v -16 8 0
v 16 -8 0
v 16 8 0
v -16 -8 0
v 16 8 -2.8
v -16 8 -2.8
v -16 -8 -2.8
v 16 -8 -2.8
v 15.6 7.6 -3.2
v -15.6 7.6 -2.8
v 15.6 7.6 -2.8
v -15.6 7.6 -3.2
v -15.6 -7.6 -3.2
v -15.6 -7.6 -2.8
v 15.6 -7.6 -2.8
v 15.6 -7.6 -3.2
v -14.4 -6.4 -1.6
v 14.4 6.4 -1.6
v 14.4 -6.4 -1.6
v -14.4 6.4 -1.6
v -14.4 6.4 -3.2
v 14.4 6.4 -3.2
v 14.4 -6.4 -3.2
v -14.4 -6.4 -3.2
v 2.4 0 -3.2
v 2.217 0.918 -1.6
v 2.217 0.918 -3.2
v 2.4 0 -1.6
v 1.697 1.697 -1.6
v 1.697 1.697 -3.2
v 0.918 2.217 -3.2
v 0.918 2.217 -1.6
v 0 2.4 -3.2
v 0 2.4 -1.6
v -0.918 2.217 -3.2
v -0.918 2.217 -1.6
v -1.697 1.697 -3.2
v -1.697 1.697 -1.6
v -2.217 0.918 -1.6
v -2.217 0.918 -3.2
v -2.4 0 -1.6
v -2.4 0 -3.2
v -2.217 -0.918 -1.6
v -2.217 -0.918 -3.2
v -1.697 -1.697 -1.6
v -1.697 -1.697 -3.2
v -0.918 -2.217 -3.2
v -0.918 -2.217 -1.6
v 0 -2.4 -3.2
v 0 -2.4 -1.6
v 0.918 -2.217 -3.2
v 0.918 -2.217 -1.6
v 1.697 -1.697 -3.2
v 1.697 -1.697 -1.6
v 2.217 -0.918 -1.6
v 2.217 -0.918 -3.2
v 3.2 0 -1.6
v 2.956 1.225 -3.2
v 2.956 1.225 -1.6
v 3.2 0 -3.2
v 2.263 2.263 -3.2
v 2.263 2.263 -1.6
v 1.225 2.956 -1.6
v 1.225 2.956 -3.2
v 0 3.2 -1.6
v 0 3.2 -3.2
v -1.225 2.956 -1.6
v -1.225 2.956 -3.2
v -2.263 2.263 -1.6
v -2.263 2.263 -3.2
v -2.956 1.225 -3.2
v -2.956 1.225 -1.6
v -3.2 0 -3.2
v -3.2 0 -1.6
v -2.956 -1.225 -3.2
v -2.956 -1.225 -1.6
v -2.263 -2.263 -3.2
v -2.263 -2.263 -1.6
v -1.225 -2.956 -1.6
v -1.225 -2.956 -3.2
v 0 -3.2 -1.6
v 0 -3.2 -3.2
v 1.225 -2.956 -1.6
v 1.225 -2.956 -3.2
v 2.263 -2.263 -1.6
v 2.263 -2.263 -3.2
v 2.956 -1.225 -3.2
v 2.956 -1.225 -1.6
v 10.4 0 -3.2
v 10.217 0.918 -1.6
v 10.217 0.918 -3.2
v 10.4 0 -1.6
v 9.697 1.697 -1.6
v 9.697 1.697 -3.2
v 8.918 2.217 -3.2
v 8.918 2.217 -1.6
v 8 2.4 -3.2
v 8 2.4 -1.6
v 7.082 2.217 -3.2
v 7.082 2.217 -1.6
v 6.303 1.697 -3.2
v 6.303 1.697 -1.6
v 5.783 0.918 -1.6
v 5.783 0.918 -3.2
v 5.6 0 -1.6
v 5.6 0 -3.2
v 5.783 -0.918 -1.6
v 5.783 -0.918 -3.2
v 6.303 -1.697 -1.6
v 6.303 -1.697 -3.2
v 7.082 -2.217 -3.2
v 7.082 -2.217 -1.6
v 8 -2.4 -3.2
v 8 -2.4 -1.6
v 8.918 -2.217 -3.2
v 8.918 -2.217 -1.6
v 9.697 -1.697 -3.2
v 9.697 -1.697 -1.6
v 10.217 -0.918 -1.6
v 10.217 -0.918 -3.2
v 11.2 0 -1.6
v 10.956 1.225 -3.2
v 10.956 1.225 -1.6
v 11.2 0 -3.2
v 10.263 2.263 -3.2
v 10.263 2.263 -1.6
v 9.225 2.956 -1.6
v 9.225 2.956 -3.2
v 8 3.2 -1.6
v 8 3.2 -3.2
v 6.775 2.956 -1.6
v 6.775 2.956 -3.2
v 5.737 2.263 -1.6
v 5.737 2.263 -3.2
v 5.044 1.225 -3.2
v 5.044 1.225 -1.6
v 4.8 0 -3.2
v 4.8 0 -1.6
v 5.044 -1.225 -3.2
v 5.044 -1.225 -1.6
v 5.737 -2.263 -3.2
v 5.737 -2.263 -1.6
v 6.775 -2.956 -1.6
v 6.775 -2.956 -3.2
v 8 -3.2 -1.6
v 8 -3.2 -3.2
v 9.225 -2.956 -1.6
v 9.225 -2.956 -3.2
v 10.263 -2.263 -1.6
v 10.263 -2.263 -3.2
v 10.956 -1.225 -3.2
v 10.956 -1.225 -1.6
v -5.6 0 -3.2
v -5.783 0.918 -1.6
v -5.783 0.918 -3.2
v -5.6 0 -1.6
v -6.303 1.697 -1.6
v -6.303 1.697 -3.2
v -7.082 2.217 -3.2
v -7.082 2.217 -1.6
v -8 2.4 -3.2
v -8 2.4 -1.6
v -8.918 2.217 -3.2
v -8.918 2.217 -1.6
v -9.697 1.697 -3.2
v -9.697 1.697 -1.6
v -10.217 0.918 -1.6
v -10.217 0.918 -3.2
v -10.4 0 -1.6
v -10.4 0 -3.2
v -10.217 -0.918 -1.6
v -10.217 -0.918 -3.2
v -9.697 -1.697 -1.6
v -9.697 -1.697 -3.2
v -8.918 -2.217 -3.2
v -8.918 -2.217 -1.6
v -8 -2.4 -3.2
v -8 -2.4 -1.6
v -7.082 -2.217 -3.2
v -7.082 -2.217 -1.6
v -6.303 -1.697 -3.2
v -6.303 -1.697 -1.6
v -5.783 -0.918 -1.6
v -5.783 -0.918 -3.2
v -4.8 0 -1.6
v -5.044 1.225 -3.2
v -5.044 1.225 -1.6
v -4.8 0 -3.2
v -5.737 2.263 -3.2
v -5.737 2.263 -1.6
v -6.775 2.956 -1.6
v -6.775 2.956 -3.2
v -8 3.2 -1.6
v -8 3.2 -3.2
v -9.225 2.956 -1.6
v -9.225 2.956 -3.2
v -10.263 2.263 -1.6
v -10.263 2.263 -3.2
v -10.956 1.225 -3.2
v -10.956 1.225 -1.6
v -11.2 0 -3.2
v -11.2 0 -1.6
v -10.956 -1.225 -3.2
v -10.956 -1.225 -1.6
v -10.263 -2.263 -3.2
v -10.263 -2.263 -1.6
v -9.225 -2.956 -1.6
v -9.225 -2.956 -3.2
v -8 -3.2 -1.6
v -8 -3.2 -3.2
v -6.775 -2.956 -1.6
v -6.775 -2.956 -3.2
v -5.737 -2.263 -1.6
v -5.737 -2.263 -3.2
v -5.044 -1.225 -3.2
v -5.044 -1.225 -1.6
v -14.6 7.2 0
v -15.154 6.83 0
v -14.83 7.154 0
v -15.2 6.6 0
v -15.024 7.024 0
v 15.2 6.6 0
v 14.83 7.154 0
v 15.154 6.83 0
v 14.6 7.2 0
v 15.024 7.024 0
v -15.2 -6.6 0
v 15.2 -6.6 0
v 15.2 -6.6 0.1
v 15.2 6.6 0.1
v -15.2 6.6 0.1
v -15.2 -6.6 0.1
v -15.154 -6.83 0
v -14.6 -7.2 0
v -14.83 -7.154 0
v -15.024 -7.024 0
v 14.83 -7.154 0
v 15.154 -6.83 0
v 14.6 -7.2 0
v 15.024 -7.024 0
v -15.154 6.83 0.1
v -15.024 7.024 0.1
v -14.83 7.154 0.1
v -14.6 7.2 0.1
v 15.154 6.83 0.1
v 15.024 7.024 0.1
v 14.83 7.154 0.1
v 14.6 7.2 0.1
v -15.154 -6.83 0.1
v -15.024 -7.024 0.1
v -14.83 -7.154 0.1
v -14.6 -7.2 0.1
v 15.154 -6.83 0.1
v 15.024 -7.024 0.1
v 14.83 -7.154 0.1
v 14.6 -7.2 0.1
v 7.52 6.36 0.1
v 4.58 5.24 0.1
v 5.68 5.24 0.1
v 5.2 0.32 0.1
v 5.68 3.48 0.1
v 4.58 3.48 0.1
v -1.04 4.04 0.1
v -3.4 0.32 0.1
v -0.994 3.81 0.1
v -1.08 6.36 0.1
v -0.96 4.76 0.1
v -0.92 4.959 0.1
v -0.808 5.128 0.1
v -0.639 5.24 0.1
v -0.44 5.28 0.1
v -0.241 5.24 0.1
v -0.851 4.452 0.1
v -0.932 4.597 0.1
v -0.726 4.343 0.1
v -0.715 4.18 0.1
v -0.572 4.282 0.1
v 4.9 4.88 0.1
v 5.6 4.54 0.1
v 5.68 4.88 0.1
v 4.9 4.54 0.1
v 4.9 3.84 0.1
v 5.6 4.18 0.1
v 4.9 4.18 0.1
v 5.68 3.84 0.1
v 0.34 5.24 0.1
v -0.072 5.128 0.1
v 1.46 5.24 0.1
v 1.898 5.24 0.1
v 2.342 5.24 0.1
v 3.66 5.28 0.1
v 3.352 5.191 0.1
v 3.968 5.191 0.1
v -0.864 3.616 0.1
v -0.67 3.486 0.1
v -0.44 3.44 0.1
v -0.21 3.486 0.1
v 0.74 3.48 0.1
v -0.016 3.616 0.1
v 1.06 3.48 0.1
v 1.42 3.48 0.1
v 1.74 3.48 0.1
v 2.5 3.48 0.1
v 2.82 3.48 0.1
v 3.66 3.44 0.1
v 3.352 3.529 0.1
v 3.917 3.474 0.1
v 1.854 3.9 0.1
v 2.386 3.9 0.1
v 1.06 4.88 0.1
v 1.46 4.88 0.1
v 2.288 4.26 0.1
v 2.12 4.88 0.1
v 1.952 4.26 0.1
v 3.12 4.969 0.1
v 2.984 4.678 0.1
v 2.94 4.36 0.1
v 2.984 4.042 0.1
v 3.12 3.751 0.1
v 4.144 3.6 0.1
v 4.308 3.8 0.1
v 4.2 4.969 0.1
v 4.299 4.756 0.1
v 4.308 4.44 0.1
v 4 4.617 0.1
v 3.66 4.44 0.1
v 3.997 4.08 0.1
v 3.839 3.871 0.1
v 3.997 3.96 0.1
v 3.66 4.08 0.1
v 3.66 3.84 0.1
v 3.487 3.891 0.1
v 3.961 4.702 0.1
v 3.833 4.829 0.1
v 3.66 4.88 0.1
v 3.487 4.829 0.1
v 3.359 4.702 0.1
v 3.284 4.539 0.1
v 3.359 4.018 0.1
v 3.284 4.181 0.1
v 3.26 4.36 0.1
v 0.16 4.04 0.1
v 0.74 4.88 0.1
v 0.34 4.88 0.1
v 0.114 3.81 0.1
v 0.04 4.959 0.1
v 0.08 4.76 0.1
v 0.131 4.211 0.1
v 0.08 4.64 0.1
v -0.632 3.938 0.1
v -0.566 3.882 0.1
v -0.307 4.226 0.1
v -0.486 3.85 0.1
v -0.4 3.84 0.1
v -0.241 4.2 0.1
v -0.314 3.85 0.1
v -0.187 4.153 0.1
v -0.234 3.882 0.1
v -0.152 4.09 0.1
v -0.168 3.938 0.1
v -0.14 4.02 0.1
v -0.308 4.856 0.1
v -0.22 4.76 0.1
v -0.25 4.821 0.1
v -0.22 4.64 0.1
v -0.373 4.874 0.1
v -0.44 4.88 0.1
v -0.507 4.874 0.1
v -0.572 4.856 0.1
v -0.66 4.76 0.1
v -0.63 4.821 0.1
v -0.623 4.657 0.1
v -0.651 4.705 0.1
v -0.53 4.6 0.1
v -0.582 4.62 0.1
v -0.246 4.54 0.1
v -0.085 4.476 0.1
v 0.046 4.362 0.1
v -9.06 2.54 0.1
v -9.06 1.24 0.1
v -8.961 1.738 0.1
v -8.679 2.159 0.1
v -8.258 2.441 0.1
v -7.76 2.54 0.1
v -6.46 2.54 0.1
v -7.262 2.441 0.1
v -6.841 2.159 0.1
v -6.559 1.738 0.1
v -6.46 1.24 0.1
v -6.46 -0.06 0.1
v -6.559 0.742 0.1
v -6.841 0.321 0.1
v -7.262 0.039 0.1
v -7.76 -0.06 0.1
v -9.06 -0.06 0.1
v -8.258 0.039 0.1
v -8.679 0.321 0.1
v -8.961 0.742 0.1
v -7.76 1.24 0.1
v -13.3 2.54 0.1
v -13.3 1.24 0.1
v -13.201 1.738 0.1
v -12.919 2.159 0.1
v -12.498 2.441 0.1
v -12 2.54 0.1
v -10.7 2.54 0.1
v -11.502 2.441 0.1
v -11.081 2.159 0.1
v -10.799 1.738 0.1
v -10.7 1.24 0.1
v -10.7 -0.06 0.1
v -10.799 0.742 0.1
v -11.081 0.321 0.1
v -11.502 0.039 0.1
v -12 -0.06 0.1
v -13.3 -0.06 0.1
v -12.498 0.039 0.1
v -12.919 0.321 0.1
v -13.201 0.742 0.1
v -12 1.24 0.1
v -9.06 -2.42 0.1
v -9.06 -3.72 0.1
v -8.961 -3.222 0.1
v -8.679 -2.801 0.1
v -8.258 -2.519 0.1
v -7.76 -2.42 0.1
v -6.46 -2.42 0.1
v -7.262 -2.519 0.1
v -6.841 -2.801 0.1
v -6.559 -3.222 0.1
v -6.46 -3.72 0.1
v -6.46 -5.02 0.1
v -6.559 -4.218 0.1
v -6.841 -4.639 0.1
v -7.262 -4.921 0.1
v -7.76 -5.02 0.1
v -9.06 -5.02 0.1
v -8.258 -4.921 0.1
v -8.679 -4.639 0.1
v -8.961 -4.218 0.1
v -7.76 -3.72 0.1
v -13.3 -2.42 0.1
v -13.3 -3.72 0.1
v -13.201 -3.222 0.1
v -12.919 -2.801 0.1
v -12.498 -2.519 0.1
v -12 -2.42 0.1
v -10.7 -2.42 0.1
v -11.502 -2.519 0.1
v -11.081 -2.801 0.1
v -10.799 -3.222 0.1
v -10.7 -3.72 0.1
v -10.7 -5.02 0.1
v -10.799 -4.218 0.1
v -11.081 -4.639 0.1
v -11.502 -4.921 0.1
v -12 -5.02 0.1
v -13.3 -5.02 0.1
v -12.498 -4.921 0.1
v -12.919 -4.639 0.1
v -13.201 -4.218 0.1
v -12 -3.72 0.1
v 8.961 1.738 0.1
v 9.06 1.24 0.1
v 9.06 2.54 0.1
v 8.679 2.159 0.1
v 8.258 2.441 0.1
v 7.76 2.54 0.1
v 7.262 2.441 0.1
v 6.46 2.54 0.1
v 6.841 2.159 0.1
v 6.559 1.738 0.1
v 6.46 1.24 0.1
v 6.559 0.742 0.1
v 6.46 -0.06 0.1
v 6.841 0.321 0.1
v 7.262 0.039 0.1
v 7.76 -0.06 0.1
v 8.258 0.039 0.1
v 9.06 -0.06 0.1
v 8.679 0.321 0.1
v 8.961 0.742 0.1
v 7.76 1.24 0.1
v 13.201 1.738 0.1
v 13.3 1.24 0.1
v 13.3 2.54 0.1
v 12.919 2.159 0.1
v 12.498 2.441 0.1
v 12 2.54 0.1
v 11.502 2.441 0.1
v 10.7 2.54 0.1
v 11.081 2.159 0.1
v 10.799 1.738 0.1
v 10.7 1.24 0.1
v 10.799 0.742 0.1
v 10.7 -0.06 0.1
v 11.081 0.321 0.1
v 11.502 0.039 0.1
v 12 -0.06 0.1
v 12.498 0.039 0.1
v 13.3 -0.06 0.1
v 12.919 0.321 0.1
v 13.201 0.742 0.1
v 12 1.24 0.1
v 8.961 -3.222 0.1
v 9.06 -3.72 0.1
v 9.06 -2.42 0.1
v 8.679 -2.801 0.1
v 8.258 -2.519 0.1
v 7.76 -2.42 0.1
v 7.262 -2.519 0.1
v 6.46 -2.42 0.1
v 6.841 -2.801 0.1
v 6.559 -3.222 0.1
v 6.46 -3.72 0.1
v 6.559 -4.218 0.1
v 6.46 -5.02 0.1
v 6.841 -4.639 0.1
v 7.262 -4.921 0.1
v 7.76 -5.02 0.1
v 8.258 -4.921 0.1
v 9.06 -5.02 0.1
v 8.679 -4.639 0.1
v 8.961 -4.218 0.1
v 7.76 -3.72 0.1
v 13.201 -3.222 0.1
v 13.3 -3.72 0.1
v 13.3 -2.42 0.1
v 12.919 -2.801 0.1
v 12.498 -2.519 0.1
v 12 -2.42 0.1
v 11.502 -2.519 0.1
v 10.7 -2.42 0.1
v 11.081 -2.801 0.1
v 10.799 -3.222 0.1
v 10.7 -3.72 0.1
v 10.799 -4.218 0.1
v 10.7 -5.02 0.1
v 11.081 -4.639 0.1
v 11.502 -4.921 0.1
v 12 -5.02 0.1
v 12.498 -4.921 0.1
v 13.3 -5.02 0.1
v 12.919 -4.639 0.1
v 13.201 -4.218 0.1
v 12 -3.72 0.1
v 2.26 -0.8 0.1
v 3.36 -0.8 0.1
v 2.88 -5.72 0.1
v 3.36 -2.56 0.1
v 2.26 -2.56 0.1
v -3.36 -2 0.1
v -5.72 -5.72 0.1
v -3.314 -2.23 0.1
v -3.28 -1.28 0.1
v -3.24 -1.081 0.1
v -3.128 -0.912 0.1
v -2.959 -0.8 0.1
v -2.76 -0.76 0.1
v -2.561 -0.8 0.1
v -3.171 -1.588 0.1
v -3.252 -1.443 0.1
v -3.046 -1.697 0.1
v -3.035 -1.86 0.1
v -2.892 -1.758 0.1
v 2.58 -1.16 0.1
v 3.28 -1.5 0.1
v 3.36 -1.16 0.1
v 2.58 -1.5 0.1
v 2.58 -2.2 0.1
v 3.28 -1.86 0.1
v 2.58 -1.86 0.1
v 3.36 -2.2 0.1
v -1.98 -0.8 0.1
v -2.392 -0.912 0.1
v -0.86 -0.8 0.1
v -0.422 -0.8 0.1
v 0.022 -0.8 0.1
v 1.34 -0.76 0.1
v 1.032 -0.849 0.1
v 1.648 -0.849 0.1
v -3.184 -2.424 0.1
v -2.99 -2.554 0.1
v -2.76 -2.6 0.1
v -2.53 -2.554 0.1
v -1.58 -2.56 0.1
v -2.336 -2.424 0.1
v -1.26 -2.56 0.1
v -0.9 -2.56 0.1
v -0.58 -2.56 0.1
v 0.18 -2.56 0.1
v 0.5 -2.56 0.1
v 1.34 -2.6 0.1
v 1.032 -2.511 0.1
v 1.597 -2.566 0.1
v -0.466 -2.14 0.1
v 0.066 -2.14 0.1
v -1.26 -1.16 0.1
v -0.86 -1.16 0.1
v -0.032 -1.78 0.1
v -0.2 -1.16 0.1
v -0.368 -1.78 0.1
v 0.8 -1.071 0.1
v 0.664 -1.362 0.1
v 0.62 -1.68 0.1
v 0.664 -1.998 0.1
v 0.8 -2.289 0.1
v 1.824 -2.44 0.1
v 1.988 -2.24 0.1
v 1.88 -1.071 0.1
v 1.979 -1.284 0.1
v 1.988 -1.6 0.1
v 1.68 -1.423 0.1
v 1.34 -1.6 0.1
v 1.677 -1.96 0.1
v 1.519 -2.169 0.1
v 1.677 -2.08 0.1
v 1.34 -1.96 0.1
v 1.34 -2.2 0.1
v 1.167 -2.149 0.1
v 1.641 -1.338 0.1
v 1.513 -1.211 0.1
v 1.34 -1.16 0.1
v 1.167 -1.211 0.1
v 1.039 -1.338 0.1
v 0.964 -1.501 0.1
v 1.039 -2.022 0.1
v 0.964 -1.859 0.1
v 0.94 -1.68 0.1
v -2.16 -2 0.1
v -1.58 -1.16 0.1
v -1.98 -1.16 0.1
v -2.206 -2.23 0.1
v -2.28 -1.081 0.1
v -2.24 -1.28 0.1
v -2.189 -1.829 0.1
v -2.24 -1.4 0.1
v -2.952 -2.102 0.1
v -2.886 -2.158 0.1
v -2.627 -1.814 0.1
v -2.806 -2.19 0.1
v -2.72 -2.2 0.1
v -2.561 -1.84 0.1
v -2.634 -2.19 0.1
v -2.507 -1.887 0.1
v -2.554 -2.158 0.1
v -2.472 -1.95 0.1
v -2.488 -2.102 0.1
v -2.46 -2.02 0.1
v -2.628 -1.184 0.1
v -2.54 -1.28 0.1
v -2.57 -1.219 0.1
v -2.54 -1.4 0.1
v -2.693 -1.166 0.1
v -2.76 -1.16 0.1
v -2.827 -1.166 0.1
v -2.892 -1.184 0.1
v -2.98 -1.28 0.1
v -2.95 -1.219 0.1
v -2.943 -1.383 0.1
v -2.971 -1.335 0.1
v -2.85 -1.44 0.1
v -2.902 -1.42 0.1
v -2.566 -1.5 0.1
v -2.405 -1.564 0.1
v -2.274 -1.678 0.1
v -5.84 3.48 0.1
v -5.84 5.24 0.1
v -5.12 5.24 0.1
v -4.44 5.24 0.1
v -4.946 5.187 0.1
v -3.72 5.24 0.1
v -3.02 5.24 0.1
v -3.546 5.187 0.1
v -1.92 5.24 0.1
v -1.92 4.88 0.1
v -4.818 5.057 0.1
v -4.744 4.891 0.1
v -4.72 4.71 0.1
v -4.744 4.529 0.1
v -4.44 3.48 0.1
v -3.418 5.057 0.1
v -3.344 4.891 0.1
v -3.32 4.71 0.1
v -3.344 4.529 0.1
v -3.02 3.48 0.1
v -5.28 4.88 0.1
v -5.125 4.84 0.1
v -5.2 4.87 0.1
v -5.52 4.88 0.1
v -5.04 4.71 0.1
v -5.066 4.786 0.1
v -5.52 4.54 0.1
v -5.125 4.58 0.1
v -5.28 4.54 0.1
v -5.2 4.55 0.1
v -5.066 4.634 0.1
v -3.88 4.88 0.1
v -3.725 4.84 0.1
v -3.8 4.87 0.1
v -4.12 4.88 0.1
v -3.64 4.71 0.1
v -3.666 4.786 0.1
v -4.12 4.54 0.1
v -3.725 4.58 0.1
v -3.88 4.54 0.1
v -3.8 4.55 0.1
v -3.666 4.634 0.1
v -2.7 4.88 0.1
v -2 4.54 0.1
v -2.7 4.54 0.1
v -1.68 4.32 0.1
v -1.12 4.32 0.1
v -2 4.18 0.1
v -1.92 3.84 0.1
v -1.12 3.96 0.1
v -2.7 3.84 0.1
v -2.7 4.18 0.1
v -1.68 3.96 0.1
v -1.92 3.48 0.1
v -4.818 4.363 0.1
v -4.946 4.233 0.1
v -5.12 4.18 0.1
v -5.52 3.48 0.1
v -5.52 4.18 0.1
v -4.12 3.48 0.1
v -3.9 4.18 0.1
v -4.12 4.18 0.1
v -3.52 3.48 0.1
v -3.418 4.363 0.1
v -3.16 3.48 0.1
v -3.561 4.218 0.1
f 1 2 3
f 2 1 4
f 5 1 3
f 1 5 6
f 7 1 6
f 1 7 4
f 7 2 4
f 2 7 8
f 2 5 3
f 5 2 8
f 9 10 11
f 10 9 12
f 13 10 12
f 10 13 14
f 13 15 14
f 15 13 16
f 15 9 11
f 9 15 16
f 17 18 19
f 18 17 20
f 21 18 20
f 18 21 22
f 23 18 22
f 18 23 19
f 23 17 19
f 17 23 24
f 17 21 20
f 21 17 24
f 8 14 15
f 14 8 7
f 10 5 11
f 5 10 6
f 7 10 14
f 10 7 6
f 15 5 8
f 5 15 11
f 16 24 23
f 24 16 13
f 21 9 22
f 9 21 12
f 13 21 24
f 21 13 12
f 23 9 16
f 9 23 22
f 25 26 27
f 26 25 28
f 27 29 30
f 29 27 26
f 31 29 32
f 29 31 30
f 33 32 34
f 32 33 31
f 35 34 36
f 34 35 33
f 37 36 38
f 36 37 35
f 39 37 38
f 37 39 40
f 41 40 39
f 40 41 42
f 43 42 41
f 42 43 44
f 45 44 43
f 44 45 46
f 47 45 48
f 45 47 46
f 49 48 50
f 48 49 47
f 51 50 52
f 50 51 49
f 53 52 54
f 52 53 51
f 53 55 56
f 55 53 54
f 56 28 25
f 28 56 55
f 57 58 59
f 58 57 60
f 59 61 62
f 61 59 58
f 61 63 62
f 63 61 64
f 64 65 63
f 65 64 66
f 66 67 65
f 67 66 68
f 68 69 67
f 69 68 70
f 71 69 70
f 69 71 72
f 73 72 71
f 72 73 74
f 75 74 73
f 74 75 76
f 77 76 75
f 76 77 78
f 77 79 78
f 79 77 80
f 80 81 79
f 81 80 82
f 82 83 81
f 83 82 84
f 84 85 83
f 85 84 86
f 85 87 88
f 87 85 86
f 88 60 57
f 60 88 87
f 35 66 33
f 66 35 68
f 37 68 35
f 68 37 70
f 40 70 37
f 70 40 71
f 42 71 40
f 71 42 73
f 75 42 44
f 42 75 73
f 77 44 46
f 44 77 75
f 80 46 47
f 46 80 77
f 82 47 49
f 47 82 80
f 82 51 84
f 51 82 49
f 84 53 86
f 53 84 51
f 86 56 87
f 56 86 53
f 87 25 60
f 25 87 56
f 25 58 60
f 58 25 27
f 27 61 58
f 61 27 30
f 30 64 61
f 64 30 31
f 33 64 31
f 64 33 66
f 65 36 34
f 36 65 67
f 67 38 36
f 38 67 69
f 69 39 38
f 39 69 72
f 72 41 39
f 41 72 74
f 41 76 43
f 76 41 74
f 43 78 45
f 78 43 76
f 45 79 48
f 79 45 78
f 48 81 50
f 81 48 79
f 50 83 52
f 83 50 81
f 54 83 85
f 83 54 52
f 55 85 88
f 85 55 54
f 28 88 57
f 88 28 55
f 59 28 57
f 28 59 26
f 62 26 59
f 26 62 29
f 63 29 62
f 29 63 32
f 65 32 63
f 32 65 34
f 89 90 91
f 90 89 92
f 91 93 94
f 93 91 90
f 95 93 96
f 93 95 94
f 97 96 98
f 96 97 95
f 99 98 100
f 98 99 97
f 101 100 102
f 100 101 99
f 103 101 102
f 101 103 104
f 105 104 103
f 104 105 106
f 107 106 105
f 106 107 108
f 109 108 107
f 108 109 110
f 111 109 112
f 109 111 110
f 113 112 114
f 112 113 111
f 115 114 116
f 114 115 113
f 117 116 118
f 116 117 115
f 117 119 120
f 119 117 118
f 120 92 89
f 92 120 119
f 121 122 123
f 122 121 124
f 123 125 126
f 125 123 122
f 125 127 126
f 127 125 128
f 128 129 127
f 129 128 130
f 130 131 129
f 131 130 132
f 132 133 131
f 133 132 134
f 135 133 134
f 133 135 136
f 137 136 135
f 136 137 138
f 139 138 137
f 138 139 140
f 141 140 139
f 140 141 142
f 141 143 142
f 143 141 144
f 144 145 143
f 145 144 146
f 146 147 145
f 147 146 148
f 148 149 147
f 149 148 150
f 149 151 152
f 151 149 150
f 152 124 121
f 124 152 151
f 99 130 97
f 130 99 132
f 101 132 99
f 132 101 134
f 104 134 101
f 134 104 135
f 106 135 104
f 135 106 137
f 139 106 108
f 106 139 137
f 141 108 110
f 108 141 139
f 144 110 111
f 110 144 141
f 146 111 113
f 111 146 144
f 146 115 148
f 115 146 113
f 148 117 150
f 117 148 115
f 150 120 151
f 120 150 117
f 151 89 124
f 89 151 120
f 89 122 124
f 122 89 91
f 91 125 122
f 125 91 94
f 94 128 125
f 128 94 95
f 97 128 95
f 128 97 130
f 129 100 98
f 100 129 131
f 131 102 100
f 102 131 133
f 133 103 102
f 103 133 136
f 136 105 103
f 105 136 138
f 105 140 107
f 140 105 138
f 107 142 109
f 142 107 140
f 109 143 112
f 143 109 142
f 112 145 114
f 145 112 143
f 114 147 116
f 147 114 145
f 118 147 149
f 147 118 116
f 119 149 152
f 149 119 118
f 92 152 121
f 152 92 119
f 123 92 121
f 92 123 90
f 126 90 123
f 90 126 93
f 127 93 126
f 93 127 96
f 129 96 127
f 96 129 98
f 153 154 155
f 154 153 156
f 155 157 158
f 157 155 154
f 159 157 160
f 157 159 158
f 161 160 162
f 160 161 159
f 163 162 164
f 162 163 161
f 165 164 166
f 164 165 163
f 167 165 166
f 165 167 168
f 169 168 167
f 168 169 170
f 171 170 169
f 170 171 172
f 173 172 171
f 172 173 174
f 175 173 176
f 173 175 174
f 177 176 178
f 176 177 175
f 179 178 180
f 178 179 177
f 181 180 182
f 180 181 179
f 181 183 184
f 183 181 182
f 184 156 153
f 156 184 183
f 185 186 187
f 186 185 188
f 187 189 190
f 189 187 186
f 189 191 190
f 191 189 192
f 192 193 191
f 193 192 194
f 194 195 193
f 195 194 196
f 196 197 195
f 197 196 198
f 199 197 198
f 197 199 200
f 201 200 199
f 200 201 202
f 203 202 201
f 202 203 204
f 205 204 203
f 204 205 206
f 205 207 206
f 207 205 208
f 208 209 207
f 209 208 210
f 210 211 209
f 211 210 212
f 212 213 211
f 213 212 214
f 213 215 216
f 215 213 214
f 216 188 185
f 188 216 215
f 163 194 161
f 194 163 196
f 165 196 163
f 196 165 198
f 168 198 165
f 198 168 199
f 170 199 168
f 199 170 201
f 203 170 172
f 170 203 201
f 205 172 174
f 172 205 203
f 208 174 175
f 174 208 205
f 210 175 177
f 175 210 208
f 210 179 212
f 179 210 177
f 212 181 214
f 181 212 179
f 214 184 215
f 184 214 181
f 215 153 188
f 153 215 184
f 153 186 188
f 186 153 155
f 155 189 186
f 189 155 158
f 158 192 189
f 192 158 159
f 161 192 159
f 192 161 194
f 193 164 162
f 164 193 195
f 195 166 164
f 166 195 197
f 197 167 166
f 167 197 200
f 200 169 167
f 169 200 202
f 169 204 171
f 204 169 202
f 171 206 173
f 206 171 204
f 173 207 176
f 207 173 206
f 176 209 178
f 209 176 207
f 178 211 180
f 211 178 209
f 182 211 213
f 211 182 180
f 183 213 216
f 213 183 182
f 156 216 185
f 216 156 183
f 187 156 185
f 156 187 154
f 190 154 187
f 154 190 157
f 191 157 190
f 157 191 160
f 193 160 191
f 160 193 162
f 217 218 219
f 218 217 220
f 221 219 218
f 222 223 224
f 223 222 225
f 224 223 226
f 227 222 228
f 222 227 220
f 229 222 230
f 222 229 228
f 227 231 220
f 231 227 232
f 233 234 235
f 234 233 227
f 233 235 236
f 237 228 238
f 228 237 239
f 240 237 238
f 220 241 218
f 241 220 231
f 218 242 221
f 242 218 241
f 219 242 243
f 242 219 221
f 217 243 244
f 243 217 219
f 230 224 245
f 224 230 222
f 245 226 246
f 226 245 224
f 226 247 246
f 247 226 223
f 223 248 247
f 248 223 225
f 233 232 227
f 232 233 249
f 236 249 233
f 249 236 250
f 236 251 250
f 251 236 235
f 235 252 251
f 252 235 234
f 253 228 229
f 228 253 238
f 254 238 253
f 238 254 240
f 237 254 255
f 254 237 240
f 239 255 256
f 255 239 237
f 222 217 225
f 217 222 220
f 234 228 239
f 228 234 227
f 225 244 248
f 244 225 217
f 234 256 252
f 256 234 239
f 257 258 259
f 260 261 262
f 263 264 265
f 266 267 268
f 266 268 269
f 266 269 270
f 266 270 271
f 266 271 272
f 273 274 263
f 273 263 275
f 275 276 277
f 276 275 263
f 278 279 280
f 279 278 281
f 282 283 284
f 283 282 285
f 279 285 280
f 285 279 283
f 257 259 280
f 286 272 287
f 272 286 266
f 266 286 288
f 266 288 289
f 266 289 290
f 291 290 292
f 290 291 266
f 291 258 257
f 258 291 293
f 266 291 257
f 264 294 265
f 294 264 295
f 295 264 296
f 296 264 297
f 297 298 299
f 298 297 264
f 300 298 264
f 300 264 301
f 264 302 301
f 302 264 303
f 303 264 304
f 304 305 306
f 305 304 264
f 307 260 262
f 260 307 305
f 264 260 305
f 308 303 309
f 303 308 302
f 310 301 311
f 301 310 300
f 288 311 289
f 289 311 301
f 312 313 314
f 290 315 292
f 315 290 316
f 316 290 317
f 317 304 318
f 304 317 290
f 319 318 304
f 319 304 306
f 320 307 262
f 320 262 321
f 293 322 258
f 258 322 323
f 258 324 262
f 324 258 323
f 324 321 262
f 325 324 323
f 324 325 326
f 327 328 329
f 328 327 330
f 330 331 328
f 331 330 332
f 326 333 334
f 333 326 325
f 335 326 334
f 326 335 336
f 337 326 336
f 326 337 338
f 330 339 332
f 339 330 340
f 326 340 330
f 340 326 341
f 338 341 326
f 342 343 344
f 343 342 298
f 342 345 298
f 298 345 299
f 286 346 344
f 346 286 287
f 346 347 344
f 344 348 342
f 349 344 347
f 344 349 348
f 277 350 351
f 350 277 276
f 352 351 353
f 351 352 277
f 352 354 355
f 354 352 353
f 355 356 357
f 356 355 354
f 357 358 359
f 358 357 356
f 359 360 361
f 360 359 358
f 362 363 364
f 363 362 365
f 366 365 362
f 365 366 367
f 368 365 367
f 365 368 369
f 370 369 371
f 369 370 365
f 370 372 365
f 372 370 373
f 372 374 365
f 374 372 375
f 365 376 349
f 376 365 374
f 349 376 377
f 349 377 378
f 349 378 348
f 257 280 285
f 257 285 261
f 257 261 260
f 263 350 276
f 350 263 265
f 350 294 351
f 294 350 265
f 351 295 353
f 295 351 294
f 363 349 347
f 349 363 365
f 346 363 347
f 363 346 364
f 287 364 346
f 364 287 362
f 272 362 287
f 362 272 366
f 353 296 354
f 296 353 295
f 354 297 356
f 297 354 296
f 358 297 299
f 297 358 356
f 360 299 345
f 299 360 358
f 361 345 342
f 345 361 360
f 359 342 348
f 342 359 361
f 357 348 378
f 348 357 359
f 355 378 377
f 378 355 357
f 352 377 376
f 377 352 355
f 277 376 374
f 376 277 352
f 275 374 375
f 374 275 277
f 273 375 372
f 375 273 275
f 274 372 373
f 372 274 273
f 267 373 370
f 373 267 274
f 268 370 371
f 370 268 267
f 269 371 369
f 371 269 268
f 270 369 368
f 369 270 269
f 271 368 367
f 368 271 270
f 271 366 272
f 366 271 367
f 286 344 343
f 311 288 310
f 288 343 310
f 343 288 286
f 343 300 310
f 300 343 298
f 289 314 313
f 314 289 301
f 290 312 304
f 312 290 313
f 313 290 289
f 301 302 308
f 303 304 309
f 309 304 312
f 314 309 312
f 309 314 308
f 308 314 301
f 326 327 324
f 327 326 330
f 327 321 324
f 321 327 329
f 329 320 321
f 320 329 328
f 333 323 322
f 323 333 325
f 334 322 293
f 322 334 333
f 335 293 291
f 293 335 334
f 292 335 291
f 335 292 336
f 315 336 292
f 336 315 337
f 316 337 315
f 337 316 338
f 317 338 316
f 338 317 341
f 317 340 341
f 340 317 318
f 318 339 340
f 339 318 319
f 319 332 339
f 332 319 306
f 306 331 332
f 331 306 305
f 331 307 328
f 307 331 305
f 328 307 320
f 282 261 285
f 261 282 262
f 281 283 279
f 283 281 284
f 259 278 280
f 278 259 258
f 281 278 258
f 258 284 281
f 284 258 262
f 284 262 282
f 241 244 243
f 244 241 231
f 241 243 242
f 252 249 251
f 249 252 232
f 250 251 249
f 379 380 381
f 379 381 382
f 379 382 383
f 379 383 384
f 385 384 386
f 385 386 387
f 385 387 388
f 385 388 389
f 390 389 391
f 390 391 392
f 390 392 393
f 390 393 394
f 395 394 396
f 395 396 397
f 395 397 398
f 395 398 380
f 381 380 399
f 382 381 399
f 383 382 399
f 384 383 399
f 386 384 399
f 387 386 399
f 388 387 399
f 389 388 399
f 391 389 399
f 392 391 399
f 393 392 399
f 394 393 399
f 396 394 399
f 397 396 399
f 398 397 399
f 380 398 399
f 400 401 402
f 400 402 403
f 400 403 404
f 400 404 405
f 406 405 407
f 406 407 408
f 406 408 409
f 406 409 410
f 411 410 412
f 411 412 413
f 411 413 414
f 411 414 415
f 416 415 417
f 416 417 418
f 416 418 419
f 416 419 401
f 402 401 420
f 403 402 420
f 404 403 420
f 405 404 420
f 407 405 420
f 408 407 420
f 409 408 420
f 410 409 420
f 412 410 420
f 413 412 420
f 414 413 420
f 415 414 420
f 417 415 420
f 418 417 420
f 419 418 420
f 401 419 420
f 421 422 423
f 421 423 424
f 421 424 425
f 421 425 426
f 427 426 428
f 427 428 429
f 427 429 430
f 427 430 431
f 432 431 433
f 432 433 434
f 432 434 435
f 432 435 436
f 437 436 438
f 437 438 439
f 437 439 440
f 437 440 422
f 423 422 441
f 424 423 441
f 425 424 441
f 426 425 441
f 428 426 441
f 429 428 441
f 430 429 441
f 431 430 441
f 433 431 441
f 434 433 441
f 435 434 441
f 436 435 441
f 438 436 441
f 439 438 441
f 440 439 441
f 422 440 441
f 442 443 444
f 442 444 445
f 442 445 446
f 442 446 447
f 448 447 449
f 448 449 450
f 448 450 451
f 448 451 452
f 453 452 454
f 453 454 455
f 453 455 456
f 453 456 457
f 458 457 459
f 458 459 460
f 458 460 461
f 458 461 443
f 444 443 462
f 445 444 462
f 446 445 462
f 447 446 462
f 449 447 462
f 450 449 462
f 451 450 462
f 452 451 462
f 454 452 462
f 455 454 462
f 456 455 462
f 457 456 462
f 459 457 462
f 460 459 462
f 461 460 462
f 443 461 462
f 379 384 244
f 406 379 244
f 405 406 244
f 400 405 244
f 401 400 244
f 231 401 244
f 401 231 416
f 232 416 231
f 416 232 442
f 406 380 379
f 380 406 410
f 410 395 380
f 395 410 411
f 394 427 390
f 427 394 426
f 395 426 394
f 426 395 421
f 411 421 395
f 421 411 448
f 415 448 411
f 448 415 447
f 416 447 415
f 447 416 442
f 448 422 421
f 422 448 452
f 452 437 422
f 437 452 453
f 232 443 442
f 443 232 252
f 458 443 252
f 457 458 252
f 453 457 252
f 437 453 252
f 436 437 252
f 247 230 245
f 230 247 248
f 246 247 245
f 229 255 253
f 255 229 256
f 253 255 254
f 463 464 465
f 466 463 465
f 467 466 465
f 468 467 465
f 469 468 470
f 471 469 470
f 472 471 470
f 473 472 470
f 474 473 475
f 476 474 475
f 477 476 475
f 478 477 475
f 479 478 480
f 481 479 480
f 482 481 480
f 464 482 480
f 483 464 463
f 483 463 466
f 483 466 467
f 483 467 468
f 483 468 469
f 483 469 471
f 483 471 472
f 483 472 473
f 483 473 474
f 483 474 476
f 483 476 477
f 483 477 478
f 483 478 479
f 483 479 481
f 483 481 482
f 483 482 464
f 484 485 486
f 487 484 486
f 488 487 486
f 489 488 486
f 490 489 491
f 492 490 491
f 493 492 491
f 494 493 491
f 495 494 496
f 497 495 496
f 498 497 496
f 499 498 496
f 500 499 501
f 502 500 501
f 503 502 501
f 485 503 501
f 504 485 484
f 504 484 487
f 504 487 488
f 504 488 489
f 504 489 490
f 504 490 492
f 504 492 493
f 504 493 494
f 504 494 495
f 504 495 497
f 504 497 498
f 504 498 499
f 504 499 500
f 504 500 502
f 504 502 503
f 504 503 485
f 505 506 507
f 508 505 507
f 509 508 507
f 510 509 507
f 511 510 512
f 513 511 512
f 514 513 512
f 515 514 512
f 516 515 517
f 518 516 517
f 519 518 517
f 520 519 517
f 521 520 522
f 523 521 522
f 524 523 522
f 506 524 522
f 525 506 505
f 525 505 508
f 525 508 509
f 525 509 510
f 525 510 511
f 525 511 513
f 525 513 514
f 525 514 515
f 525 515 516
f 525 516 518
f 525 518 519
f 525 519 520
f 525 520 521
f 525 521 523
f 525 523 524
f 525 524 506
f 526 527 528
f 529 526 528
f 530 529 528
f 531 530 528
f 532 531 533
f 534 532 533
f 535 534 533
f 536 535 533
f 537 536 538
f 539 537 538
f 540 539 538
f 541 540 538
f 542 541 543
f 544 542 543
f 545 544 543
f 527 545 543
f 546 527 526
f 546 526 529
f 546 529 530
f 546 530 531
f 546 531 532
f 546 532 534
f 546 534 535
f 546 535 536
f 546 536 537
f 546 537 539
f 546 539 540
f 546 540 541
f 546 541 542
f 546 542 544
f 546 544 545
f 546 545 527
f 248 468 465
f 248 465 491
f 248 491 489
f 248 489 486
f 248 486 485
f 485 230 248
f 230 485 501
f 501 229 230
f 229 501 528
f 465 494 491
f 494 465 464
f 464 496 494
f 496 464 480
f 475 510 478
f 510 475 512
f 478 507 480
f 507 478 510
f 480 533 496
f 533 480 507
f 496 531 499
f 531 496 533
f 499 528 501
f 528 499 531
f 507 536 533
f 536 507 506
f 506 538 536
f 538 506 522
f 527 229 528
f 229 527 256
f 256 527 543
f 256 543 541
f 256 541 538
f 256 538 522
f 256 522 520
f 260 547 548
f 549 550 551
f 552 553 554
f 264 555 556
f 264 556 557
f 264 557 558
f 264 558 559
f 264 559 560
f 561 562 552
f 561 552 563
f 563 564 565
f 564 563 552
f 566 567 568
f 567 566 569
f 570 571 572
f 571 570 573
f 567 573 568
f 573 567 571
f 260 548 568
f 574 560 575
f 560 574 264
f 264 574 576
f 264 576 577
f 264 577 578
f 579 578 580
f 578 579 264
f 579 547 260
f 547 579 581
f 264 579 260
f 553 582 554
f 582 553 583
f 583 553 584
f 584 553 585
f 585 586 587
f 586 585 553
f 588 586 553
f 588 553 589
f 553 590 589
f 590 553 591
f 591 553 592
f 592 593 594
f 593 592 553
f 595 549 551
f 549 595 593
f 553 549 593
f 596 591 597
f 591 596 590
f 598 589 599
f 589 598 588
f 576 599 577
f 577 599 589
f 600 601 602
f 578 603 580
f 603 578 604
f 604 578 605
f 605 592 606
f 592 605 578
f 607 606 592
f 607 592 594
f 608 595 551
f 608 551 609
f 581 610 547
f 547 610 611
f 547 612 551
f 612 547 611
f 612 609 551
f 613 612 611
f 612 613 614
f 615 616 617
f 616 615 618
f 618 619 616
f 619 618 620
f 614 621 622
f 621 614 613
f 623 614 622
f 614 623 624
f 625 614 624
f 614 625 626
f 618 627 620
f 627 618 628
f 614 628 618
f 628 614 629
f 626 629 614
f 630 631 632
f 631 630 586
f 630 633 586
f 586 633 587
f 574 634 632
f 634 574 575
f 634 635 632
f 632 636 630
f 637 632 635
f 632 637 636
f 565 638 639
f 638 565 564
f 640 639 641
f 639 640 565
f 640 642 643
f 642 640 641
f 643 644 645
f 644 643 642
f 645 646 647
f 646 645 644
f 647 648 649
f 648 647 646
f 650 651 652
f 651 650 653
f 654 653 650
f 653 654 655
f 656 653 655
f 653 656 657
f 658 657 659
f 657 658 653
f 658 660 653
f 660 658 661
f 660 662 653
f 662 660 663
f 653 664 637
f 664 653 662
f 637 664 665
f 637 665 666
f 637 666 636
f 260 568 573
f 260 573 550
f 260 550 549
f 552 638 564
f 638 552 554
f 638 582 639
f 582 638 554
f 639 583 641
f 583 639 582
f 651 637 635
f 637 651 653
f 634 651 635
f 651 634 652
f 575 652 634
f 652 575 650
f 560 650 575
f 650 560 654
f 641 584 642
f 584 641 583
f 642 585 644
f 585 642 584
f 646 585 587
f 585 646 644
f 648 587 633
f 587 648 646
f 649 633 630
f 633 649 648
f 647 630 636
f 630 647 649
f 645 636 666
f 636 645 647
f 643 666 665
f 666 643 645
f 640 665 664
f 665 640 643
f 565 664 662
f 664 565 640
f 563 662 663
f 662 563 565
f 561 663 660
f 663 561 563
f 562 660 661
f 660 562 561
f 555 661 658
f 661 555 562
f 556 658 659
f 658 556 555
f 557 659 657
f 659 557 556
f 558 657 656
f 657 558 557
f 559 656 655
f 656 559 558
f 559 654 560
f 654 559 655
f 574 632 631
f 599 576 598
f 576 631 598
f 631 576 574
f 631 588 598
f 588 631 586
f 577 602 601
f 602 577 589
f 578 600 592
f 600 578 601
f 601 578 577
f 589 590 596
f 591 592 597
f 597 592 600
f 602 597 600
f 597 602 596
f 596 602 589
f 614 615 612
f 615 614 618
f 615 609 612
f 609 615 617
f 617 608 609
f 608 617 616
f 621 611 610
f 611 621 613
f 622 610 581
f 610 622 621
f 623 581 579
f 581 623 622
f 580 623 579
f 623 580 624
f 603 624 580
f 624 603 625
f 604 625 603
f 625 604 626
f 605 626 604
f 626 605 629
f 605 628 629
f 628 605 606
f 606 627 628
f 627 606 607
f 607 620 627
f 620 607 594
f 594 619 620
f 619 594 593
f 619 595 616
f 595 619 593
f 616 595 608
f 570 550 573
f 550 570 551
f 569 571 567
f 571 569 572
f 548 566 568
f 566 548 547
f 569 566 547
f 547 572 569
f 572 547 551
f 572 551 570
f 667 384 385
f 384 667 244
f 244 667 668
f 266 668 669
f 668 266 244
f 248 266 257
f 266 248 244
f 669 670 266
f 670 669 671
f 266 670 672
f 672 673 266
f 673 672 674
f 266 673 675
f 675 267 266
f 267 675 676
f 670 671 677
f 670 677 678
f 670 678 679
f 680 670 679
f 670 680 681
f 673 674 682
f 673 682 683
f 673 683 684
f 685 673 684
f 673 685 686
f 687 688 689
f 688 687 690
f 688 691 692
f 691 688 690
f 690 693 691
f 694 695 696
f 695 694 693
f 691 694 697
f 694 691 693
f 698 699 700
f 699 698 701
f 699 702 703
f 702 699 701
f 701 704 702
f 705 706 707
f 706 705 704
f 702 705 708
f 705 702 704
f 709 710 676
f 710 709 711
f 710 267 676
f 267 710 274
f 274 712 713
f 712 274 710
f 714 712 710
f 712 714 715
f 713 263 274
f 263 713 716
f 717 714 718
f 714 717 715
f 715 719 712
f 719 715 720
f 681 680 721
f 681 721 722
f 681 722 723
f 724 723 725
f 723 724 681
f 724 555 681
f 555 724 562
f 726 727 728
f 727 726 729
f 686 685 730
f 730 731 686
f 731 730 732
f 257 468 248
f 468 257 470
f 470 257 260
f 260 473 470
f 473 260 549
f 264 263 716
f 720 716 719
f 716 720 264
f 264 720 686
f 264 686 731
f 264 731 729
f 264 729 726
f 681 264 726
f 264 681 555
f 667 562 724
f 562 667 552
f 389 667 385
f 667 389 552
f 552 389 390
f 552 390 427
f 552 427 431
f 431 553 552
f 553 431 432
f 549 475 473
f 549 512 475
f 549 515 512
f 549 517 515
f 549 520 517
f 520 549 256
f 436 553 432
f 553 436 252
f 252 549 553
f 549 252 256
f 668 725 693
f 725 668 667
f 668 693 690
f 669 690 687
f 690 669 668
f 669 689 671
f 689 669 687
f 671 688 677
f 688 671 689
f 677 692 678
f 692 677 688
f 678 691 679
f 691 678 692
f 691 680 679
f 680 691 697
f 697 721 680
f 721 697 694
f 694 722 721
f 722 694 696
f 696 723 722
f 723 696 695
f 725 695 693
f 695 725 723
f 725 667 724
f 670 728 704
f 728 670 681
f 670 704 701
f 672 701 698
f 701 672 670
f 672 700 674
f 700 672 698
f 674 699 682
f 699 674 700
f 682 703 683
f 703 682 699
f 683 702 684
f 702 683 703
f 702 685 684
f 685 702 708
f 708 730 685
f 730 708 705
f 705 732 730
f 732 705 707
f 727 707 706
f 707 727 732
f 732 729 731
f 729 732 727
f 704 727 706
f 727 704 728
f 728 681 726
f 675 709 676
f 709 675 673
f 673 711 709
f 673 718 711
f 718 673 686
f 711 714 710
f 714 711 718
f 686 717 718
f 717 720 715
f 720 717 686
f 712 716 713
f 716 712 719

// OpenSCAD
use <../lib.scad>
use <6177973v.scad>
use <87079.scad>
function ldraw_lib__87079d1c() = [
// 0 Tile  2 x  4 with Four Yellow Discs, White "PRE-STAGE" and "STAGE" on Black Background Sticker
// 0 Name: 87079d1c.dat
// 0 Author: Vincent Messenet [Cheenzo]
// 0 !LDRAW_ORG Shortcut UPDATE 2026-09
// 0 !LICENSE Licensed under CC BY 4.0 : see CAreadme.txt
// 
// 0 BFC CERTIFY CCW
  [0,"BFC","CERTIFY"],
  [0,"BFC","CCW"],
// 
// 0 !CATEGORY Sticker Shortcut
// 0 !KEYWORDS Bricklink 87079pb1382, Set 75883
// 
// 0 !HISTORY 2026-09-30 [OrionP] Official Update 2026-09
// 
// 1 16 0 0 0 1 0 0 0 1 0 0 0 1 87079.dat
  [1,16,0,0,0,1,0,0,0,1,0,0,0,1, ldraw_lib__87079()],
// 1 16 0 0 0 1 0 0 0 1 0 0 0 1 6177973v.dat
  [1,16,0,0,0,1,0,0,0,1,0,0,0,1, ldraw_lib__6177973v()],
];
module ldraw_lib__87079d1c(step=0, col=false, unit=2/5, alt=false, line=0.2, solid=!$preview)
    makepoly(ldraw_lib__87079d1c(), step=step, col=col, unit=unit, alt=alt, line=line, solid=solid);
ldraw_lib__87079d1c(line=0.2);
